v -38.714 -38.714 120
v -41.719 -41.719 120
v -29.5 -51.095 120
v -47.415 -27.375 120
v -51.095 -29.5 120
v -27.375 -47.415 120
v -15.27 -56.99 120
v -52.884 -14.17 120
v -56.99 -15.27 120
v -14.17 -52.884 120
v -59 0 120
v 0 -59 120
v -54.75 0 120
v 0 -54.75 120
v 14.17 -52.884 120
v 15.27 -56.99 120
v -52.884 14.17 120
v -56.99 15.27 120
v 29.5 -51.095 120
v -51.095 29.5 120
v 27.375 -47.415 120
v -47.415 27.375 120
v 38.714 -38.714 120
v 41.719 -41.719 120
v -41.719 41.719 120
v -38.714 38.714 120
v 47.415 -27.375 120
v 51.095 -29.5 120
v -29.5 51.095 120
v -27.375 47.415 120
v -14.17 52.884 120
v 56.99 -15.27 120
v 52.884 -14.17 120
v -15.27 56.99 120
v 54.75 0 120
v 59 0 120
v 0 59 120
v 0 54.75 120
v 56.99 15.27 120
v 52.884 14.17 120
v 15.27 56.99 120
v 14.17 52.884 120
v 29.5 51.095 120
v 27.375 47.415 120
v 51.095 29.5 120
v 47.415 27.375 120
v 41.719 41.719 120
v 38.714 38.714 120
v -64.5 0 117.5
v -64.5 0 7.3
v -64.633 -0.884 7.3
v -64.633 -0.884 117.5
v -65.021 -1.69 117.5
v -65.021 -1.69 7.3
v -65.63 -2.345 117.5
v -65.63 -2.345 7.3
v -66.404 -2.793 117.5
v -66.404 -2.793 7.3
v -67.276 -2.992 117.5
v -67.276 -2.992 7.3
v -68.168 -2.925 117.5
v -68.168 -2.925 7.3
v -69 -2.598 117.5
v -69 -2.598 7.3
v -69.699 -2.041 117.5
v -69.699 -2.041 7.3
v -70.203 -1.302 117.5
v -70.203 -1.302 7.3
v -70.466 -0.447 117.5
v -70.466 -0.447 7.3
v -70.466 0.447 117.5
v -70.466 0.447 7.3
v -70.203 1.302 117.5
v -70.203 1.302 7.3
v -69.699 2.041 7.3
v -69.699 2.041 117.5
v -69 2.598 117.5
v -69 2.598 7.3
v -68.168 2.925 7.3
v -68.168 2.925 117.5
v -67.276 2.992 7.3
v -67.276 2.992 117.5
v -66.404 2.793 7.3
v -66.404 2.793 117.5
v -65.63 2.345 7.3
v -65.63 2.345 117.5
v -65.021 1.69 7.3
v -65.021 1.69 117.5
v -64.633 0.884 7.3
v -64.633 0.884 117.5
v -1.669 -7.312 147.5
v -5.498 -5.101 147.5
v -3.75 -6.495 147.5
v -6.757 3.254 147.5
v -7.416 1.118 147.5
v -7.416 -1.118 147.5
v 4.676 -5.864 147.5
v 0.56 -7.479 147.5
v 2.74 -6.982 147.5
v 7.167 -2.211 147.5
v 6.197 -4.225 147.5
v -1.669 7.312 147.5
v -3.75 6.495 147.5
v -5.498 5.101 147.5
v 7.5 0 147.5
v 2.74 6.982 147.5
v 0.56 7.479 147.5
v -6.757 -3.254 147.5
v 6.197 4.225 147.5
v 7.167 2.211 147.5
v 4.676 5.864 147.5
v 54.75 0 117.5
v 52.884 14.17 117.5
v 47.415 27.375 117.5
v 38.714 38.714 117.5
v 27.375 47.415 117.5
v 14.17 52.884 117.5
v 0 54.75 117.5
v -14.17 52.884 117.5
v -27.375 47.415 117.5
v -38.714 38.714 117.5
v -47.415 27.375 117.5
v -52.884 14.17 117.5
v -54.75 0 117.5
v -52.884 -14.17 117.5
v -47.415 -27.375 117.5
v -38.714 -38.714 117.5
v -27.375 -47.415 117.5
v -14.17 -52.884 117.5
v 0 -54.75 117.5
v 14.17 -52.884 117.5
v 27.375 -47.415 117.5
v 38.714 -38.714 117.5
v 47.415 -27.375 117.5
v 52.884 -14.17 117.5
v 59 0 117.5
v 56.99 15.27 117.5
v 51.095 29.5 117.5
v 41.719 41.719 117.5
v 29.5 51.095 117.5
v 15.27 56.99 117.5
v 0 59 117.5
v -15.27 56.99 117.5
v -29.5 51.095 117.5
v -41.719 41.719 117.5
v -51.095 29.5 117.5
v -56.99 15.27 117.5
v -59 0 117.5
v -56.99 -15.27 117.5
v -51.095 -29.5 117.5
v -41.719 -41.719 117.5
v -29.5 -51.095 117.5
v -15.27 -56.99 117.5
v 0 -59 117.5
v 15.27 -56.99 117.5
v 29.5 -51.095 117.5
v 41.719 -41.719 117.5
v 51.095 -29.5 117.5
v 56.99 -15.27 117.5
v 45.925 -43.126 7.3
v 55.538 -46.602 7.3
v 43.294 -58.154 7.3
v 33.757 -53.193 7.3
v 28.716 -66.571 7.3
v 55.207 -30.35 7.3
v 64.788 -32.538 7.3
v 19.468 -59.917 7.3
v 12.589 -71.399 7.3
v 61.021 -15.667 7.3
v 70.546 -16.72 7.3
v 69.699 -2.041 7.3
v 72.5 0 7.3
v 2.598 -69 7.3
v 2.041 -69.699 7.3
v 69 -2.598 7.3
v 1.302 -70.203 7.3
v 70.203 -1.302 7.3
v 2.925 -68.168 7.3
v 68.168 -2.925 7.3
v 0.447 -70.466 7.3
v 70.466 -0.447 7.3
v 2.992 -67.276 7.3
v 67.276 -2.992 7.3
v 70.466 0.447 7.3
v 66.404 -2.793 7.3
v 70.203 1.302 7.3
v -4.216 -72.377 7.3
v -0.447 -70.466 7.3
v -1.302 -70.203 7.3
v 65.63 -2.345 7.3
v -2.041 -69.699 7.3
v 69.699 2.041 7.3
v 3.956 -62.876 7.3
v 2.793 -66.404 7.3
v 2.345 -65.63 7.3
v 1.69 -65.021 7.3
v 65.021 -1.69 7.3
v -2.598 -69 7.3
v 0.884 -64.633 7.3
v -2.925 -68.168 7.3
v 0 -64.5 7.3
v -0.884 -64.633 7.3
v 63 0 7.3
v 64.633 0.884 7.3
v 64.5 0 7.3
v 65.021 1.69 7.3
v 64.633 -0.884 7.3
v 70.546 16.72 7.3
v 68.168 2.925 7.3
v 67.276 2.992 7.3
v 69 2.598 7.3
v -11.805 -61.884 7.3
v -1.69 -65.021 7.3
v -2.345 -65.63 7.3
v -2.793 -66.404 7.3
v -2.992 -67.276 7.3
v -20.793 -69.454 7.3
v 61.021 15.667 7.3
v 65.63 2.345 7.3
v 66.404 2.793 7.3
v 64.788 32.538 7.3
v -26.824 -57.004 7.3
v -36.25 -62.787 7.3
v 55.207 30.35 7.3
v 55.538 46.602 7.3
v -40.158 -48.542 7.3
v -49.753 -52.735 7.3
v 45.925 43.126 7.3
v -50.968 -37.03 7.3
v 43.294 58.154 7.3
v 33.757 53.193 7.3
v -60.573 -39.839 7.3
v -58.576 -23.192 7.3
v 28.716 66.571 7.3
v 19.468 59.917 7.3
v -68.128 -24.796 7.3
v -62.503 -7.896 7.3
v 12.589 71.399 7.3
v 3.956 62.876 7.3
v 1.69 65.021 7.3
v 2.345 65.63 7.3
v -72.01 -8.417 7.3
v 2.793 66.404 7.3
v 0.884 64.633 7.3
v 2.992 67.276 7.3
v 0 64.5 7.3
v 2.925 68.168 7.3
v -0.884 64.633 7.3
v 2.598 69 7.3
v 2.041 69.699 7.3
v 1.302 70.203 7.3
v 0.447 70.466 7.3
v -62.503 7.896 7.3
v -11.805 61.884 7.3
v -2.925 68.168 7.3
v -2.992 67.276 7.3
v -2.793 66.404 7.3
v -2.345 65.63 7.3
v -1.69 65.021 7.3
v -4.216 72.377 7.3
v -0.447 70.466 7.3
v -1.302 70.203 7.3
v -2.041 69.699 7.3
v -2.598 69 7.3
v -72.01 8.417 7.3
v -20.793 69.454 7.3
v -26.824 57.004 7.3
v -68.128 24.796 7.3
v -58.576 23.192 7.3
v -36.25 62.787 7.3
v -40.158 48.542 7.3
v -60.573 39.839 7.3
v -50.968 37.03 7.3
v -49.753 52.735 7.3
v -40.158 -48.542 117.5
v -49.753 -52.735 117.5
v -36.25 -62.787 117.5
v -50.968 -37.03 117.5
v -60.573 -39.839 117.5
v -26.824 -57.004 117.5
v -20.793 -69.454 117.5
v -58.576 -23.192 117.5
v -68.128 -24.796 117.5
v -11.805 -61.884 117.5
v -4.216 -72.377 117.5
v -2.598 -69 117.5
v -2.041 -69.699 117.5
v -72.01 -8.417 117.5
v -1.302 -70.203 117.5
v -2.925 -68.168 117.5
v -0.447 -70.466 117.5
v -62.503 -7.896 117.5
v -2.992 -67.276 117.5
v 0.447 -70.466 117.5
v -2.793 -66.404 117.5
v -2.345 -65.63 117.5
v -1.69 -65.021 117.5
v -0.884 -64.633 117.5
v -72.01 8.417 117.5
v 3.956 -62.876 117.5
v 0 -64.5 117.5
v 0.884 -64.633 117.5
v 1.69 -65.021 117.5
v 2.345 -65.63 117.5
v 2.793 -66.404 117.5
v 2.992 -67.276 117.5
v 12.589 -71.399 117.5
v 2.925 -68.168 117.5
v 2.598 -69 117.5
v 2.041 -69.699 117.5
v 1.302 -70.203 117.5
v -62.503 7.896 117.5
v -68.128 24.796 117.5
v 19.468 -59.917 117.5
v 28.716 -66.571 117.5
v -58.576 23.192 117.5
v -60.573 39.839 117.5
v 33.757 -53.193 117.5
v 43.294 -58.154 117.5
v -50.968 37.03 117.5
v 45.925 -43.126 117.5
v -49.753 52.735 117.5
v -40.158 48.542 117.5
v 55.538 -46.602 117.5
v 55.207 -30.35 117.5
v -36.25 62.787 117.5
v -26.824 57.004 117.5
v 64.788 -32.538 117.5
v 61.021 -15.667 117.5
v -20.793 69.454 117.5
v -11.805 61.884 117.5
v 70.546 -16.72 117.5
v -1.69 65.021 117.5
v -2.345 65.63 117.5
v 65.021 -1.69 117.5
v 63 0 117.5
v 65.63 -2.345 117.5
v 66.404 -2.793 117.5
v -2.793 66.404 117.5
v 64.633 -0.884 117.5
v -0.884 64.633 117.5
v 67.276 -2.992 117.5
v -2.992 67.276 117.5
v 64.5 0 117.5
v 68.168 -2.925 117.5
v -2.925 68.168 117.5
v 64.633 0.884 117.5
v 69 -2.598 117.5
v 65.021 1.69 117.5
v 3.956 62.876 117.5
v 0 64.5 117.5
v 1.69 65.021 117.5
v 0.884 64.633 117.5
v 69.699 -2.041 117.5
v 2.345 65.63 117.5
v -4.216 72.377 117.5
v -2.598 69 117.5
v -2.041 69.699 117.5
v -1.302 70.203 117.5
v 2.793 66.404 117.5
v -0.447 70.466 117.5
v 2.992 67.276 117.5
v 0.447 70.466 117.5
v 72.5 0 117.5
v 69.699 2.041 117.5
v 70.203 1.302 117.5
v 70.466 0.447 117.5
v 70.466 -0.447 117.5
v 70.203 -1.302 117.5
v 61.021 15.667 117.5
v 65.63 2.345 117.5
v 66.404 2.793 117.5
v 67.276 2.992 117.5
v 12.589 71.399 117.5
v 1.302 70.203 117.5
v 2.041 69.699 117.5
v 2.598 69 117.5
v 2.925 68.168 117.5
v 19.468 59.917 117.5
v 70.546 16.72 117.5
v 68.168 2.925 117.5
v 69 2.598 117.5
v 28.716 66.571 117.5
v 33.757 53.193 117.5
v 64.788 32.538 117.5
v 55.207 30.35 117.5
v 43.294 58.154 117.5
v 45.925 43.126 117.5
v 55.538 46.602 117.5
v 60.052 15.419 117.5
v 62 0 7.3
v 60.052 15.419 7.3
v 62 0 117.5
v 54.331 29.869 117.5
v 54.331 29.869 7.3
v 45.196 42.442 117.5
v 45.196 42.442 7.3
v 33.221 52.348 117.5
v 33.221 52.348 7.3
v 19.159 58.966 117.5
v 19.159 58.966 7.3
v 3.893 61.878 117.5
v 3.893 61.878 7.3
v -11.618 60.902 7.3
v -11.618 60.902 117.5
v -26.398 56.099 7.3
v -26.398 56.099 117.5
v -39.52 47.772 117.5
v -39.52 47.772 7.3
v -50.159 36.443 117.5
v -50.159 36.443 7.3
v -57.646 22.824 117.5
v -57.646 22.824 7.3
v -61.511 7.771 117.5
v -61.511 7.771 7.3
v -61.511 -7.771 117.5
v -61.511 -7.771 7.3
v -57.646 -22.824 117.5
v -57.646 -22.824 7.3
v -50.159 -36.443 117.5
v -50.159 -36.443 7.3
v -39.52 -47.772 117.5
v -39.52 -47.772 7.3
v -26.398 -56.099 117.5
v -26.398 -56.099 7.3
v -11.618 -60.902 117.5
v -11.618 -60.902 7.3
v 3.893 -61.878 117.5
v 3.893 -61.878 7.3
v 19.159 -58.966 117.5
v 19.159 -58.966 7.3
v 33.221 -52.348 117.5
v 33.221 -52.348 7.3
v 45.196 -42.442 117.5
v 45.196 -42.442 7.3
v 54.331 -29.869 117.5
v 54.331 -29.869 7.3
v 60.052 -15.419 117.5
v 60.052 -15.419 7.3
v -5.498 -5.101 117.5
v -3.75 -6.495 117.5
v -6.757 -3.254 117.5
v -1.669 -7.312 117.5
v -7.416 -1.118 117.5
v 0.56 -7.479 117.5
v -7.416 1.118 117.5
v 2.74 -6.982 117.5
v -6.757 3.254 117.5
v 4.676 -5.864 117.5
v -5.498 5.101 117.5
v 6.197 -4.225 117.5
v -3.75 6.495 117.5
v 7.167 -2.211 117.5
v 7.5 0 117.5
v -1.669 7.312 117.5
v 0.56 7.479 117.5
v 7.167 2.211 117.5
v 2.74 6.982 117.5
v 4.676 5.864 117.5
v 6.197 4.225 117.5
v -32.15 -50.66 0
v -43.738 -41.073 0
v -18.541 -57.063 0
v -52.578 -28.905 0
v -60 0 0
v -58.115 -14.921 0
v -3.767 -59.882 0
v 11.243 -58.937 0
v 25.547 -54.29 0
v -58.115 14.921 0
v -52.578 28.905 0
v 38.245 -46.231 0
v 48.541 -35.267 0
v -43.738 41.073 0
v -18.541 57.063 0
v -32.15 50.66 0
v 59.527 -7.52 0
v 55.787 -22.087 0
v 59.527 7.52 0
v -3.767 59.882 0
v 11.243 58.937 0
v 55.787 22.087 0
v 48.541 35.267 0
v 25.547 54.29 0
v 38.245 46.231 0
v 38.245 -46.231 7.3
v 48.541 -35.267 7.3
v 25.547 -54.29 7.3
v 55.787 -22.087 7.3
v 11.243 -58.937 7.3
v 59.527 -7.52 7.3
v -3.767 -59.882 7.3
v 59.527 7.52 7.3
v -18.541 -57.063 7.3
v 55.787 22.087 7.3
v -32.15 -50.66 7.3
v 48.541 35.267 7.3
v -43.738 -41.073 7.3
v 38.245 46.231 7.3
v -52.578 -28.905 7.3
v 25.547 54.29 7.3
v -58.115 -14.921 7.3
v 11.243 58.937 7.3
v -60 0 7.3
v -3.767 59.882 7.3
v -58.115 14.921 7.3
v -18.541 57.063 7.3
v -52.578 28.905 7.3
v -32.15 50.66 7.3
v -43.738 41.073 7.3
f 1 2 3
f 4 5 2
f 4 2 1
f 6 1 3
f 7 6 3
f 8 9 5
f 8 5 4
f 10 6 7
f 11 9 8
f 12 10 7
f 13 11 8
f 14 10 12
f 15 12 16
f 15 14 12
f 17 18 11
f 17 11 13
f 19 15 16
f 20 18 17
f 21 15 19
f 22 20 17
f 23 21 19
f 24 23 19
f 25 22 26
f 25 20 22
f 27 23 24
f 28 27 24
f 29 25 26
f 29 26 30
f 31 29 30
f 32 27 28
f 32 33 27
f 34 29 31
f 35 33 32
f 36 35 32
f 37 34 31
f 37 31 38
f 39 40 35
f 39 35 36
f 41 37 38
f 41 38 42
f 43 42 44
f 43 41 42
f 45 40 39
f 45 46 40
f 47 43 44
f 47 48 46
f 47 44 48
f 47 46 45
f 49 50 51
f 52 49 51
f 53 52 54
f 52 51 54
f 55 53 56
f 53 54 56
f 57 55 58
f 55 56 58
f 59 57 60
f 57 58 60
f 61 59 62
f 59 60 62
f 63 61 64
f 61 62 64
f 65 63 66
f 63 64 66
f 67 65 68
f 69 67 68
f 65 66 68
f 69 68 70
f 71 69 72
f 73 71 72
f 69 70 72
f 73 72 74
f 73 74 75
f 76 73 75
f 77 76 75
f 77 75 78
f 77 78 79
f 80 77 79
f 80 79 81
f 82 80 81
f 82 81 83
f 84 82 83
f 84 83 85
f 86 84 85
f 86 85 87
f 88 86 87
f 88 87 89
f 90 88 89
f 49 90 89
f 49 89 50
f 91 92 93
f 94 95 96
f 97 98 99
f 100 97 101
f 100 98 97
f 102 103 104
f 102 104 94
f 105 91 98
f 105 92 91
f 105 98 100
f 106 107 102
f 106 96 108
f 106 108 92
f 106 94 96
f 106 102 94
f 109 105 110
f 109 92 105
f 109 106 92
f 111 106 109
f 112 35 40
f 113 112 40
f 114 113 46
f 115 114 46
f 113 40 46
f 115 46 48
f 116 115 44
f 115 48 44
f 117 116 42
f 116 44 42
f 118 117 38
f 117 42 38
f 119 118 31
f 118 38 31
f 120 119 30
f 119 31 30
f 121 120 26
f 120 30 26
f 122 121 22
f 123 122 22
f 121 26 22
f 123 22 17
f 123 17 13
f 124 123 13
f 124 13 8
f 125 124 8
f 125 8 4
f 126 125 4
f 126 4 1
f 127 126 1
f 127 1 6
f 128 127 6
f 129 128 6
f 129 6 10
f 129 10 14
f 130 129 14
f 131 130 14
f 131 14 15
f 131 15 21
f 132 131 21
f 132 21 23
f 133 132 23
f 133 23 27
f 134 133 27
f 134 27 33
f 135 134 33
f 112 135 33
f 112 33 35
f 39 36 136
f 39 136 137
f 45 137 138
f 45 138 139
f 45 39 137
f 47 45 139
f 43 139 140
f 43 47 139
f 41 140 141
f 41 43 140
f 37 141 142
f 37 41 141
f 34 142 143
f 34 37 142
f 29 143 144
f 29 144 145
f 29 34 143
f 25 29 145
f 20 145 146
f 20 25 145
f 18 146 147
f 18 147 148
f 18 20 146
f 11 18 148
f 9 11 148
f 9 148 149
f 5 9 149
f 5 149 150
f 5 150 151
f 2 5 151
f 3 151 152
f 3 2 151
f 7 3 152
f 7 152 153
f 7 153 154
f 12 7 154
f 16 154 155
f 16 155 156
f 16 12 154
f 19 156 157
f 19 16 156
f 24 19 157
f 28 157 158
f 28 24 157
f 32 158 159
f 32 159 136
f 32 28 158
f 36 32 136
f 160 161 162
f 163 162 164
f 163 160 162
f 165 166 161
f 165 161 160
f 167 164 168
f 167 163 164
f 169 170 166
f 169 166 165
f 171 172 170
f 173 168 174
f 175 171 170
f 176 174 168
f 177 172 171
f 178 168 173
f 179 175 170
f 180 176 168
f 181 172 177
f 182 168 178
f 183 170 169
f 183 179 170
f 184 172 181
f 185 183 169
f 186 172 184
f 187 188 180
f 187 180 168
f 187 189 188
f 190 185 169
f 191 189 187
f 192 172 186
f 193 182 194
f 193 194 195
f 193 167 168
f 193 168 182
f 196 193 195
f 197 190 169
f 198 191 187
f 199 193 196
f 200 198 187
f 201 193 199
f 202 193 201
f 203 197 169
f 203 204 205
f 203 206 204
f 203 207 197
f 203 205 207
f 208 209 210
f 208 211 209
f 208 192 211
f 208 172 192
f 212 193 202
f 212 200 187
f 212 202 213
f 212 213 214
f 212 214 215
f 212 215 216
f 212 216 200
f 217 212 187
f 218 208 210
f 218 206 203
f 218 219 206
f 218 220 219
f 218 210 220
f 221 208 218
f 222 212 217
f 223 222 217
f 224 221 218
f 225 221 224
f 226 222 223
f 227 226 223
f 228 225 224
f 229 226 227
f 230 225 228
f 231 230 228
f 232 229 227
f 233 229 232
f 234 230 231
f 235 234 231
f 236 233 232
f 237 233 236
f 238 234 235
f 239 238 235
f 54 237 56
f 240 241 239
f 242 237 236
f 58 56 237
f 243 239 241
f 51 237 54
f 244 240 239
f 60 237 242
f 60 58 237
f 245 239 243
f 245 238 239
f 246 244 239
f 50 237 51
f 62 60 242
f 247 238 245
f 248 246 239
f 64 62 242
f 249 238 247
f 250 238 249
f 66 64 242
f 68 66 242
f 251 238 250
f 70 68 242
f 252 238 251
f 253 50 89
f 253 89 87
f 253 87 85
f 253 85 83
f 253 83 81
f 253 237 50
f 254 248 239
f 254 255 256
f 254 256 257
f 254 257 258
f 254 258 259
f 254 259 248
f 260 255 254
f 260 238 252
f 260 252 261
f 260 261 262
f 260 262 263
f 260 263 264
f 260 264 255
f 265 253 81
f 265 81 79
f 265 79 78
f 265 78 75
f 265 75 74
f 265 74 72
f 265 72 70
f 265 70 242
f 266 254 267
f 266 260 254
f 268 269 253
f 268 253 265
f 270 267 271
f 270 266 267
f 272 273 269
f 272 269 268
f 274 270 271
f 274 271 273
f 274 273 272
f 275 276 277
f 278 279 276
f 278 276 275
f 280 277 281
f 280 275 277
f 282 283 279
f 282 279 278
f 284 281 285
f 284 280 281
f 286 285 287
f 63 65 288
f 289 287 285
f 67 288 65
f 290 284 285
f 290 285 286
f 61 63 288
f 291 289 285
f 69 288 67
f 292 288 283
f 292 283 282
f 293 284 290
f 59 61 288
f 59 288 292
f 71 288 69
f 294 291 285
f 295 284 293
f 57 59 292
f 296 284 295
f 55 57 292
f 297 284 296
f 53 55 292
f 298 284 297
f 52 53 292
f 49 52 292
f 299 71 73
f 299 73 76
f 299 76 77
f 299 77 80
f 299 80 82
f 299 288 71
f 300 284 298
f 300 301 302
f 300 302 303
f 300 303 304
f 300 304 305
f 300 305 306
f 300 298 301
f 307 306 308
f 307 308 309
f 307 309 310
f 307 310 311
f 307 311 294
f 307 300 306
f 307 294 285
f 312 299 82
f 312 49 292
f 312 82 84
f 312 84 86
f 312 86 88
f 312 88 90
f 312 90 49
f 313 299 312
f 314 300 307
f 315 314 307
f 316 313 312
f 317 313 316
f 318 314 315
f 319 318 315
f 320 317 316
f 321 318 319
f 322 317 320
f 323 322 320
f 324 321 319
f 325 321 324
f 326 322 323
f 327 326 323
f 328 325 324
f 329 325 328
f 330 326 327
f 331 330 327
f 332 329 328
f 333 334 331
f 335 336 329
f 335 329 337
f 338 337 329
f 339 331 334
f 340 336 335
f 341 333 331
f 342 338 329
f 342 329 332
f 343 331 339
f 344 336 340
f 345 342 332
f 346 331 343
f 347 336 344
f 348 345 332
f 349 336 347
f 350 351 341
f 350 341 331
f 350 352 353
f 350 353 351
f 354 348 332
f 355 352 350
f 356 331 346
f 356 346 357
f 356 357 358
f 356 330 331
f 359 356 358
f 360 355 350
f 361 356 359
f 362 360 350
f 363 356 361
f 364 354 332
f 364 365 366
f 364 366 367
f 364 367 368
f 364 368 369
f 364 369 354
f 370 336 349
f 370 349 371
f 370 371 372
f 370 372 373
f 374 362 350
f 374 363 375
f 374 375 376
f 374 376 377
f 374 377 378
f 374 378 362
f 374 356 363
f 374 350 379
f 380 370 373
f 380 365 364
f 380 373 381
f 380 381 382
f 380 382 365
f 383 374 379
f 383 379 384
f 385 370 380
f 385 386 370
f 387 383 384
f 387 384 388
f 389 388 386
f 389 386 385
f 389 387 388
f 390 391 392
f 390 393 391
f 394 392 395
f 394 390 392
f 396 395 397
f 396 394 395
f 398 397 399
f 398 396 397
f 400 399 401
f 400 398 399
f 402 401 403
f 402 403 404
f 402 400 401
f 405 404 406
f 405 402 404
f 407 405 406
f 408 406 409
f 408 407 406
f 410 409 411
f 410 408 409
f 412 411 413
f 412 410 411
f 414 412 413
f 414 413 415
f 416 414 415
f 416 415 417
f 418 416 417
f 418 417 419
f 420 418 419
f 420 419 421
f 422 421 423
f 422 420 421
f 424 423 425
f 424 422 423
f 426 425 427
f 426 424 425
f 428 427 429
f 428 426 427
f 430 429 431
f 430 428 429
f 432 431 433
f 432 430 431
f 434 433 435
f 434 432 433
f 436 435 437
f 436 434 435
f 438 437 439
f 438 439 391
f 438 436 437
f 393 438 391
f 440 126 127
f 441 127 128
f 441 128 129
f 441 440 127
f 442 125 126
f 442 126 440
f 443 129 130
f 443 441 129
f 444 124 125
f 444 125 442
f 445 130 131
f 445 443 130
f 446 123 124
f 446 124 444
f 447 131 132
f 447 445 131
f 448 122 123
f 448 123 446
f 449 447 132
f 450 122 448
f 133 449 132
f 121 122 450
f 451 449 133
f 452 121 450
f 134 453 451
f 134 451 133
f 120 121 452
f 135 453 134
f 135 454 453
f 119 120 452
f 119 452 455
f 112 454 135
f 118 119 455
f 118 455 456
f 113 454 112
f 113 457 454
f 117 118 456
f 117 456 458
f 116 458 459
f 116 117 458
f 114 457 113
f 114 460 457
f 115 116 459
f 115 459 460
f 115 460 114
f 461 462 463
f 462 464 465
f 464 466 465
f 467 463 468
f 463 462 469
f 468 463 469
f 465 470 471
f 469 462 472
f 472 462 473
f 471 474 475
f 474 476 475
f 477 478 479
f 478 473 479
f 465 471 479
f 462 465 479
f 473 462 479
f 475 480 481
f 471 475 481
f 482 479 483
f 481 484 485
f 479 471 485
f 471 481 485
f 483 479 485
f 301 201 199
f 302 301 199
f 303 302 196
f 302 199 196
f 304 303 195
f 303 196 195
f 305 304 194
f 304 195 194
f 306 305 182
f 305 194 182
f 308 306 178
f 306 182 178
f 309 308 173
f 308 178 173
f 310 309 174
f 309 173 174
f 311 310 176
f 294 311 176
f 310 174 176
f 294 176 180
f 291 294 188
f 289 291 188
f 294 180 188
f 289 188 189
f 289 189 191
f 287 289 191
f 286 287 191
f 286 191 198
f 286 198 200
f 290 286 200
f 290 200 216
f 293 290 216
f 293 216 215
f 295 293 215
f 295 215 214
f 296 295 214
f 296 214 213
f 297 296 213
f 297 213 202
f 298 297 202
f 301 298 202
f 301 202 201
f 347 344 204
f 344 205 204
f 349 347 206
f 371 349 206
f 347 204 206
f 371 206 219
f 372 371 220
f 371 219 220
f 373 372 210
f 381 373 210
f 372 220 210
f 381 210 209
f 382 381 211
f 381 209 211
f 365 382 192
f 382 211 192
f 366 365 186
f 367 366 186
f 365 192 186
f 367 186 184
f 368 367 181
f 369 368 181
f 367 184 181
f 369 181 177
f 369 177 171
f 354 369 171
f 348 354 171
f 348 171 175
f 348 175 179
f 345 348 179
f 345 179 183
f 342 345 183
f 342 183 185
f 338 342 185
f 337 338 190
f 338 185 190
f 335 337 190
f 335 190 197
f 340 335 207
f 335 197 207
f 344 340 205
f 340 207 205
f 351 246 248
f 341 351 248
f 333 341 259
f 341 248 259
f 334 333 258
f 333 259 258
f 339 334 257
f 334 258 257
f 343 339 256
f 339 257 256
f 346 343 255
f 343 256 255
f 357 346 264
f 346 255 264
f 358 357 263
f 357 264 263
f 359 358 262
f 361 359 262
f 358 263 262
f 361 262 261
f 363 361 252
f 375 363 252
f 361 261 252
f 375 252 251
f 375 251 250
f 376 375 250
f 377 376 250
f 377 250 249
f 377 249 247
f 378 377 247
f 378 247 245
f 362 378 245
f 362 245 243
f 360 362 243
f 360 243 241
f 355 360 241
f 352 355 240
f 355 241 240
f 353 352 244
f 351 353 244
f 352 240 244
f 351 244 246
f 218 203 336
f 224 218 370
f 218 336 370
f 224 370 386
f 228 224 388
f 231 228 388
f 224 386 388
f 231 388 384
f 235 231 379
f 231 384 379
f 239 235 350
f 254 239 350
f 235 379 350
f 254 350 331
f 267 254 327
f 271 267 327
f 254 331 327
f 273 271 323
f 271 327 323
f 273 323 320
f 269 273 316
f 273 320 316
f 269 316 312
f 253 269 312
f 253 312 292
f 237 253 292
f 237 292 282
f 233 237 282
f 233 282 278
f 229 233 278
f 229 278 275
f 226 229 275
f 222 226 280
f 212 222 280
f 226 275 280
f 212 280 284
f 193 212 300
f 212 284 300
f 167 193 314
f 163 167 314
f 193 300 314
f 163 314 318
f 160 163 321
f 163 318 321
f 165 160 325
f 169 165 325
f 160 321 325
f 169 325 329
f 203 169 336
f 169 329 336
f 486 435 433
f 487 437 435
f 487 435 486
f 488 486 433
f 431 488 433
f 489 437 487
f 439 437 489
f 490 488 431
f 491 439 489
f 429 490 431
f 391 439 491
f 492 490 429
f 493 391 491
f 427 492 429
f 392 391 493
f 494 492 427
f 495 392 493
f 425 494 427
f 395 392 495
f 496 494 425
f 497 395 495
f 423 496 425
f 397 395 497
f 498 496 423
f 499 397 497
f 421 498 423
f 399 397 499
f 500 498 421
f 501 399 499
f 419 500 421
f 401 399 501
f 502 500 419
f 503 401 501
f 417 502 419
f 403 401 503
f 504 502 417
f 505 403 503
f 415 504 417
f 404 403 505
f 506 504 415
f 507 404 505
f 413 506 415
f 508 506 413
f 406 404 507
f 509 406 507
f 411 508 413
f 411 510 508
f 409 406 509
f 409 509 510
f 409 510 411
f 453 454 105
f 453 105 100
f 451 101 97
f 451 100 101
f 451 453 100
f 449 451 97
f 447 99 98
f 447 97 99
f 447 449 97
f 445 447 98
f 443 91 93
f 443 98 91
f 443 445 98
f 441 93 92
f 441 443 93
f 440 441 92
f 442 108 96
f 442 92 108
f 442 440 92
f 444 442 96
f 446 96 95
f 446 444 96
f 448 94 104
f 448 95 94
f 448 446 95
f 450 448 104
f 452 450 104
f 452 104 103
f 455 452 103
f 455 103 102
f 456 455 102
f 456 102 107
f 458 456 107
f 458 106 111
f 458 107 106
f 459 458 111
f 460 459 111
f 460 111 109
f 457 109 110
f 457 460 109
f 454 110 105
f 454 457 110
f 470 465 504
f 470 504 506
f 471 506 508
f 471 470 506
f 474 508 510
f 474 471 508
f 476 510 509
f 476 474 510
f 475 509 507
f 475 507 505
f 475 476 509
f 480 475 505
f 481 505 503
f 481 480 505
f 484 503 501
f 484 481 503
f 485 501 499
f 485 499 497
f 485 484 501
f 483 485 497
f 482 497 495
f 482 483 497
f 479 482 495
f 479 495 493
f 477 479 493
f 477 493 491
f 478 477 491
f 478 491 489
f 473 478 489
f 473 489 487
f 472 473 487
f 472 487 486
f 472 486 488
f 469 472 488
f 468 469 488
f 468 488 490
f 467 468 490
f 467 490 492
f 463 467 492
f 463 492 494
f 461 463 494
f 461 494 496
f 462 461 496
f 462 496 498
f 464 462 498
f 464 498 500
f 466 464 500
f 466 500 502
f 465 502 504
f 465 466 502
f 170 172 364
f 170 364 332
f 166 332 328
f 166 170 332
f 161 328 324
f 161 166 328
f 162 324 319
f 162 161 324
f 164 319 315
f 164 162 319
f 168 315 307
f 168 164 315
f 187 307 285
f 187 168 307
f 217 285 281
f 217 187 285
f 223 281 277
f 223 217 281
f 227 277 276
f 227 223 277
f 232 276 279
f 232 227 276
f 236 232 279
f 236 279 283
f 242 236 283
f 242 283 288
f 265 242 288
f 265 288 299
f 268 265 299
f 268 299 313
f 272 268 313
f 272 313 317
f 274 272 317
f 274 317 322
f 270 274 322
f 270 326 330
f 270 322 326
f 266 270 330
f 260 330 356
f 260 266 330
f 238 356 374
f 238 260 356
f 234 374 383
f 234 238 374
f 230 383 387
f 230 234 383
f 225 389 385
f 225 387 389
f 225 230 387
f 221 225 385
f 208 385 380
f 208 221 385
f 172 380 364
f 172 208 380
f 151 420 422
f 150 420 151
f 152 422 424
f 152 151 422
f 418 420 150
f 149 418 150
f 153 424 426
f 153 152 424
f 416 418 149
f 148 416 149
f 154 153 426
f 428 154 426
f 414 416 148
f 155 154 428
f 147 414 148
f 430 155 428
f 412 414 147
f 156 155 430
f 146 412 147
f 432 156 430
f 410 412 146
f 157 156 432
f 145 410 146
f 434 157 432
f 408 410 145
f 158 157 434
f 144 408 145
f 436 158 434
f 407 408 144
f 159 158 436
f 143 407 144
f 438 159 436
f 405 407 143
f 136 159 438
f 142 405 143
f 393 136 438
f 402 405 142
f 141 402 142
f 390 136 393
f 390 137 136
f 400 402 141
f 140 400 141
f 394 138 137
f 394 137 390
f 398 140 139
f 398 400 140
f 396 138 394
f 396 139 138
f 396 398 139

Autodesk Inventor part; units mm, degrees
ref_plane "YZ Plane" through (0, 0, 0) normal (1, 0, 0) x (0, 1, 0)
ref_plane "XZ Plane" through (0, 0, 0) normal (0, 1, 0) x (-1, 0, 0)
ref_plane "XY Plane" through (0, 0, 0) normal (0, 0, 1) x (1, 0, 0)
sketch "Sketch1" plane through (0, 0, 0) normal (0, 0, 1) x (1, 0, 0)
  circle A0 centre (0, 0) radius 72.5
  dimension "d0" = 145
extrude "Extrusion1" add sketch "Sketch1" along normal blind 120
sketch "Sketch2" plane through (0, 0, 120) normal (0, 0, 1) x (1, 0, 0)
  circle A0 centre (0, 0) radius 59
  circle A1 centre (0, 0) radius 54.75
  circle A2 centre (0, 0) radius 72.5 projected
  dimension "d3" = 118
  dimension "d4" = 109.5
extrude "Extrusion2" cut sketch "Sketch2" against normal blind 2.5
sketch "Sketch3" plane through (0, 0, 117.5) normal (0, 0, 1) x (1, 0, 0)
  circle A0 centre (0, 0) radius 7.5
  dimension "d7" = 15
extrude "Extrusion3" add sketch "Sketch3" along normal blind 30
sketch "Sketch4" plane through (0, 0, 117.5) normal (0, 0, 1) x (1, 0, 0)
  point P0 (0, 0)
  point P1 (0, 67.5)
  dimension "d10" = 67.5
hole "Hole1" at (0, 67.5, 117.5) direction (0, 0, -1) diameter 6 end through all
pattern_circular "Circular Pattern1" count 4 over 360 about axis through (0, 0, 117.5) along (0, 0, 1) of "Hole1"
sketch "Sketch5" plane through (0, 0, 117.5) normal (0, 0, 1) x (1, 0, 0)
  circle A0 centre (0, 0) radius 62
  circle A1 centre (0, 0) radius 63
  dimension "d21" = 124
  dimension "d22" = 1
extrude "Extrusion4" cut sketch "Sketch5" against normal through all
sketch "Sketch6" plane through (0, 0, 0) normal (0, 0, -1) x (-1, 0, 0)
  circle A0 centre (0, 0) radius 72.5 projected
  circle A1 centre (0, 67.5) radius 3 projected
  circle A2 centre (67.5, 0) radius 3 projected
  circle A3 centre (0, -67.5) radius 3 projected
  circle A4 centre (-67.5, 0) radius 3 projected
  circle A5 centre (0, 0) radius 63 projected
  circle A6 centre (0, 0) radius 7.5 projected
  circle A7 centre (0, 0) radius 60
  dimension "d27" = 120
extrude "Extrusion5" cut sketch "Sketch6" against normal blind 7.3 contours A0 | A5
properties part number "Denzel4500Motor"
